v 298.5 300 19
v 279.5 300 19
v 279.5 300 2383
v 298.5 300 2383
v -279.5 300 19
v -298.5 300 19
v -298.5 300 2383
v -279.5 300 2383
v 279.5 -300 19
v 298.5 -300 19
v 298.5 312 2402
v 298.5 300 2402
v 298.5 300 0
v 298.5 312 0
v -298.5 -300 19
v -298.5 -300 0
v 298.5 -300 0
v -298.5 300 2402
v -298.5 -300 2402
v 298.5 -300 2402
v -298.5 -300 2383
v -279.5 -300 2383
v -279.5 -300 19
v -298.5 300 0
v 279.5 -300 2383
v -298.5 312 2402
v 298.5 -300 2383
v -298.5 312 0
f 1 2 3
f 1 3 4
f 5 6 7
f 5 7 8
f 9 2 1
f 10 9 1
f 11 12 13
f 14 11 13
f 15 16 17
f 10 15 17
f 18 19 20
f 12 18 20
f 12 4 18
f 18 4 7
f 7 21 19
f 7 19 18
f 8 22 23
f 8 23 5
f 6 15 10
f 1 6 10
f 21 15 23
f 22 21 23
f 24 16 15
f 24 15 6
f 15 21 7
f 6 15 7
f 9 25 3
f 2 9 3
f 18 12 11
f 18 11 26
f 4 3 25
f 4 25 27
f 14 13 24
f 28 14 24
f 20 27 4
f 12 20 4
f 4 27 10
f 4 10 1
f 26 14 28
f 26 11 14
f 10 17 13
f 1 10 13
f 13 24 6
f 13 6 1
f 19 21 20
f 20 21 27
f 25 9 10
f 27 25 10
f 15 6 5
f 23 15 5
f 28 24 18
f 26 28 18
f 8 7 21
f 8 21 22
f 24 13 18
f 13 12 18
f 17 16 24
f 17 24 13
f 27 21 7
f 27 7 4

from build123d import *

# Parameters (mm, degrees)
F0_W      = 597
F0_H      = 600
F2_DEPTH  = 19
F4_W      = 19
F4_H      = 600
F5_DEPTH  = 2364
F6_W      = 19
F6_H      = 600
F7_DEPTH  = 2364
F8_W      = 578
F8_H      = 600
F8_W_2    = 19
F9_DEPTH  = 19
F10_W     = 597
F10_H     = 2383
F10_H_2   = 19
F12_DEPTH = 12


with BuildPart() as f2:
    # F0 (on Top) → F2 (new body)
    with BuildSketch(Plane.XY):
        Rectangle(F0_W, F0_H)
    extrude(amount=F2_DEPTH)


with BuildPart() as f5:
    # F4 (on face) → F5 (new body)
    with BuildSketch(Plane.XY.offset(19)):
        with Locations((-289, 0)):
            Rectangle(F4_W, F4_H)
    extrude(amount=F5_DEPTH)


with BuildPart() as f7:
    # F6 (on face) → F7 (new body)
    with BuildSketch(Plane.XY.offset(19)):
        with Locations((289, 0)):
            Rectangle(F6_W, F6_H)
    extrude(amount=F7_DEPTH)


with BuildPart() as f9:
    # F8 (on face) → F9 (new body)
    with BuildSketch(Plane.XY.offset(2383)):
        with Locations((9.5, 0)):
            Rectangle(F8_W, F8_H)
        with Locations((-289, 0)):
            Rectangle(F8_W_2, F8_H)
    extrude(amount=F9_DEPTH)


with BuildPart() as f12:
    # F10 (on face) → F12 (new body)
    with BuildSketch(Plane(origin=(0, 300, 0), x_dir=(-1, 0, 0), z_dir=(0, 1, 0))):
        with Locations((0, 1191.5)):
            Rectangle(F10_W, F10_H)
        with Locations((0, 2392.5)):
            Rectangle(F10_W, F10_H_2)
    extrude(amount=F12_DEPTH)


solid = Compound([f2.part, f5.part, f7.part, f9.part, f12.part])
